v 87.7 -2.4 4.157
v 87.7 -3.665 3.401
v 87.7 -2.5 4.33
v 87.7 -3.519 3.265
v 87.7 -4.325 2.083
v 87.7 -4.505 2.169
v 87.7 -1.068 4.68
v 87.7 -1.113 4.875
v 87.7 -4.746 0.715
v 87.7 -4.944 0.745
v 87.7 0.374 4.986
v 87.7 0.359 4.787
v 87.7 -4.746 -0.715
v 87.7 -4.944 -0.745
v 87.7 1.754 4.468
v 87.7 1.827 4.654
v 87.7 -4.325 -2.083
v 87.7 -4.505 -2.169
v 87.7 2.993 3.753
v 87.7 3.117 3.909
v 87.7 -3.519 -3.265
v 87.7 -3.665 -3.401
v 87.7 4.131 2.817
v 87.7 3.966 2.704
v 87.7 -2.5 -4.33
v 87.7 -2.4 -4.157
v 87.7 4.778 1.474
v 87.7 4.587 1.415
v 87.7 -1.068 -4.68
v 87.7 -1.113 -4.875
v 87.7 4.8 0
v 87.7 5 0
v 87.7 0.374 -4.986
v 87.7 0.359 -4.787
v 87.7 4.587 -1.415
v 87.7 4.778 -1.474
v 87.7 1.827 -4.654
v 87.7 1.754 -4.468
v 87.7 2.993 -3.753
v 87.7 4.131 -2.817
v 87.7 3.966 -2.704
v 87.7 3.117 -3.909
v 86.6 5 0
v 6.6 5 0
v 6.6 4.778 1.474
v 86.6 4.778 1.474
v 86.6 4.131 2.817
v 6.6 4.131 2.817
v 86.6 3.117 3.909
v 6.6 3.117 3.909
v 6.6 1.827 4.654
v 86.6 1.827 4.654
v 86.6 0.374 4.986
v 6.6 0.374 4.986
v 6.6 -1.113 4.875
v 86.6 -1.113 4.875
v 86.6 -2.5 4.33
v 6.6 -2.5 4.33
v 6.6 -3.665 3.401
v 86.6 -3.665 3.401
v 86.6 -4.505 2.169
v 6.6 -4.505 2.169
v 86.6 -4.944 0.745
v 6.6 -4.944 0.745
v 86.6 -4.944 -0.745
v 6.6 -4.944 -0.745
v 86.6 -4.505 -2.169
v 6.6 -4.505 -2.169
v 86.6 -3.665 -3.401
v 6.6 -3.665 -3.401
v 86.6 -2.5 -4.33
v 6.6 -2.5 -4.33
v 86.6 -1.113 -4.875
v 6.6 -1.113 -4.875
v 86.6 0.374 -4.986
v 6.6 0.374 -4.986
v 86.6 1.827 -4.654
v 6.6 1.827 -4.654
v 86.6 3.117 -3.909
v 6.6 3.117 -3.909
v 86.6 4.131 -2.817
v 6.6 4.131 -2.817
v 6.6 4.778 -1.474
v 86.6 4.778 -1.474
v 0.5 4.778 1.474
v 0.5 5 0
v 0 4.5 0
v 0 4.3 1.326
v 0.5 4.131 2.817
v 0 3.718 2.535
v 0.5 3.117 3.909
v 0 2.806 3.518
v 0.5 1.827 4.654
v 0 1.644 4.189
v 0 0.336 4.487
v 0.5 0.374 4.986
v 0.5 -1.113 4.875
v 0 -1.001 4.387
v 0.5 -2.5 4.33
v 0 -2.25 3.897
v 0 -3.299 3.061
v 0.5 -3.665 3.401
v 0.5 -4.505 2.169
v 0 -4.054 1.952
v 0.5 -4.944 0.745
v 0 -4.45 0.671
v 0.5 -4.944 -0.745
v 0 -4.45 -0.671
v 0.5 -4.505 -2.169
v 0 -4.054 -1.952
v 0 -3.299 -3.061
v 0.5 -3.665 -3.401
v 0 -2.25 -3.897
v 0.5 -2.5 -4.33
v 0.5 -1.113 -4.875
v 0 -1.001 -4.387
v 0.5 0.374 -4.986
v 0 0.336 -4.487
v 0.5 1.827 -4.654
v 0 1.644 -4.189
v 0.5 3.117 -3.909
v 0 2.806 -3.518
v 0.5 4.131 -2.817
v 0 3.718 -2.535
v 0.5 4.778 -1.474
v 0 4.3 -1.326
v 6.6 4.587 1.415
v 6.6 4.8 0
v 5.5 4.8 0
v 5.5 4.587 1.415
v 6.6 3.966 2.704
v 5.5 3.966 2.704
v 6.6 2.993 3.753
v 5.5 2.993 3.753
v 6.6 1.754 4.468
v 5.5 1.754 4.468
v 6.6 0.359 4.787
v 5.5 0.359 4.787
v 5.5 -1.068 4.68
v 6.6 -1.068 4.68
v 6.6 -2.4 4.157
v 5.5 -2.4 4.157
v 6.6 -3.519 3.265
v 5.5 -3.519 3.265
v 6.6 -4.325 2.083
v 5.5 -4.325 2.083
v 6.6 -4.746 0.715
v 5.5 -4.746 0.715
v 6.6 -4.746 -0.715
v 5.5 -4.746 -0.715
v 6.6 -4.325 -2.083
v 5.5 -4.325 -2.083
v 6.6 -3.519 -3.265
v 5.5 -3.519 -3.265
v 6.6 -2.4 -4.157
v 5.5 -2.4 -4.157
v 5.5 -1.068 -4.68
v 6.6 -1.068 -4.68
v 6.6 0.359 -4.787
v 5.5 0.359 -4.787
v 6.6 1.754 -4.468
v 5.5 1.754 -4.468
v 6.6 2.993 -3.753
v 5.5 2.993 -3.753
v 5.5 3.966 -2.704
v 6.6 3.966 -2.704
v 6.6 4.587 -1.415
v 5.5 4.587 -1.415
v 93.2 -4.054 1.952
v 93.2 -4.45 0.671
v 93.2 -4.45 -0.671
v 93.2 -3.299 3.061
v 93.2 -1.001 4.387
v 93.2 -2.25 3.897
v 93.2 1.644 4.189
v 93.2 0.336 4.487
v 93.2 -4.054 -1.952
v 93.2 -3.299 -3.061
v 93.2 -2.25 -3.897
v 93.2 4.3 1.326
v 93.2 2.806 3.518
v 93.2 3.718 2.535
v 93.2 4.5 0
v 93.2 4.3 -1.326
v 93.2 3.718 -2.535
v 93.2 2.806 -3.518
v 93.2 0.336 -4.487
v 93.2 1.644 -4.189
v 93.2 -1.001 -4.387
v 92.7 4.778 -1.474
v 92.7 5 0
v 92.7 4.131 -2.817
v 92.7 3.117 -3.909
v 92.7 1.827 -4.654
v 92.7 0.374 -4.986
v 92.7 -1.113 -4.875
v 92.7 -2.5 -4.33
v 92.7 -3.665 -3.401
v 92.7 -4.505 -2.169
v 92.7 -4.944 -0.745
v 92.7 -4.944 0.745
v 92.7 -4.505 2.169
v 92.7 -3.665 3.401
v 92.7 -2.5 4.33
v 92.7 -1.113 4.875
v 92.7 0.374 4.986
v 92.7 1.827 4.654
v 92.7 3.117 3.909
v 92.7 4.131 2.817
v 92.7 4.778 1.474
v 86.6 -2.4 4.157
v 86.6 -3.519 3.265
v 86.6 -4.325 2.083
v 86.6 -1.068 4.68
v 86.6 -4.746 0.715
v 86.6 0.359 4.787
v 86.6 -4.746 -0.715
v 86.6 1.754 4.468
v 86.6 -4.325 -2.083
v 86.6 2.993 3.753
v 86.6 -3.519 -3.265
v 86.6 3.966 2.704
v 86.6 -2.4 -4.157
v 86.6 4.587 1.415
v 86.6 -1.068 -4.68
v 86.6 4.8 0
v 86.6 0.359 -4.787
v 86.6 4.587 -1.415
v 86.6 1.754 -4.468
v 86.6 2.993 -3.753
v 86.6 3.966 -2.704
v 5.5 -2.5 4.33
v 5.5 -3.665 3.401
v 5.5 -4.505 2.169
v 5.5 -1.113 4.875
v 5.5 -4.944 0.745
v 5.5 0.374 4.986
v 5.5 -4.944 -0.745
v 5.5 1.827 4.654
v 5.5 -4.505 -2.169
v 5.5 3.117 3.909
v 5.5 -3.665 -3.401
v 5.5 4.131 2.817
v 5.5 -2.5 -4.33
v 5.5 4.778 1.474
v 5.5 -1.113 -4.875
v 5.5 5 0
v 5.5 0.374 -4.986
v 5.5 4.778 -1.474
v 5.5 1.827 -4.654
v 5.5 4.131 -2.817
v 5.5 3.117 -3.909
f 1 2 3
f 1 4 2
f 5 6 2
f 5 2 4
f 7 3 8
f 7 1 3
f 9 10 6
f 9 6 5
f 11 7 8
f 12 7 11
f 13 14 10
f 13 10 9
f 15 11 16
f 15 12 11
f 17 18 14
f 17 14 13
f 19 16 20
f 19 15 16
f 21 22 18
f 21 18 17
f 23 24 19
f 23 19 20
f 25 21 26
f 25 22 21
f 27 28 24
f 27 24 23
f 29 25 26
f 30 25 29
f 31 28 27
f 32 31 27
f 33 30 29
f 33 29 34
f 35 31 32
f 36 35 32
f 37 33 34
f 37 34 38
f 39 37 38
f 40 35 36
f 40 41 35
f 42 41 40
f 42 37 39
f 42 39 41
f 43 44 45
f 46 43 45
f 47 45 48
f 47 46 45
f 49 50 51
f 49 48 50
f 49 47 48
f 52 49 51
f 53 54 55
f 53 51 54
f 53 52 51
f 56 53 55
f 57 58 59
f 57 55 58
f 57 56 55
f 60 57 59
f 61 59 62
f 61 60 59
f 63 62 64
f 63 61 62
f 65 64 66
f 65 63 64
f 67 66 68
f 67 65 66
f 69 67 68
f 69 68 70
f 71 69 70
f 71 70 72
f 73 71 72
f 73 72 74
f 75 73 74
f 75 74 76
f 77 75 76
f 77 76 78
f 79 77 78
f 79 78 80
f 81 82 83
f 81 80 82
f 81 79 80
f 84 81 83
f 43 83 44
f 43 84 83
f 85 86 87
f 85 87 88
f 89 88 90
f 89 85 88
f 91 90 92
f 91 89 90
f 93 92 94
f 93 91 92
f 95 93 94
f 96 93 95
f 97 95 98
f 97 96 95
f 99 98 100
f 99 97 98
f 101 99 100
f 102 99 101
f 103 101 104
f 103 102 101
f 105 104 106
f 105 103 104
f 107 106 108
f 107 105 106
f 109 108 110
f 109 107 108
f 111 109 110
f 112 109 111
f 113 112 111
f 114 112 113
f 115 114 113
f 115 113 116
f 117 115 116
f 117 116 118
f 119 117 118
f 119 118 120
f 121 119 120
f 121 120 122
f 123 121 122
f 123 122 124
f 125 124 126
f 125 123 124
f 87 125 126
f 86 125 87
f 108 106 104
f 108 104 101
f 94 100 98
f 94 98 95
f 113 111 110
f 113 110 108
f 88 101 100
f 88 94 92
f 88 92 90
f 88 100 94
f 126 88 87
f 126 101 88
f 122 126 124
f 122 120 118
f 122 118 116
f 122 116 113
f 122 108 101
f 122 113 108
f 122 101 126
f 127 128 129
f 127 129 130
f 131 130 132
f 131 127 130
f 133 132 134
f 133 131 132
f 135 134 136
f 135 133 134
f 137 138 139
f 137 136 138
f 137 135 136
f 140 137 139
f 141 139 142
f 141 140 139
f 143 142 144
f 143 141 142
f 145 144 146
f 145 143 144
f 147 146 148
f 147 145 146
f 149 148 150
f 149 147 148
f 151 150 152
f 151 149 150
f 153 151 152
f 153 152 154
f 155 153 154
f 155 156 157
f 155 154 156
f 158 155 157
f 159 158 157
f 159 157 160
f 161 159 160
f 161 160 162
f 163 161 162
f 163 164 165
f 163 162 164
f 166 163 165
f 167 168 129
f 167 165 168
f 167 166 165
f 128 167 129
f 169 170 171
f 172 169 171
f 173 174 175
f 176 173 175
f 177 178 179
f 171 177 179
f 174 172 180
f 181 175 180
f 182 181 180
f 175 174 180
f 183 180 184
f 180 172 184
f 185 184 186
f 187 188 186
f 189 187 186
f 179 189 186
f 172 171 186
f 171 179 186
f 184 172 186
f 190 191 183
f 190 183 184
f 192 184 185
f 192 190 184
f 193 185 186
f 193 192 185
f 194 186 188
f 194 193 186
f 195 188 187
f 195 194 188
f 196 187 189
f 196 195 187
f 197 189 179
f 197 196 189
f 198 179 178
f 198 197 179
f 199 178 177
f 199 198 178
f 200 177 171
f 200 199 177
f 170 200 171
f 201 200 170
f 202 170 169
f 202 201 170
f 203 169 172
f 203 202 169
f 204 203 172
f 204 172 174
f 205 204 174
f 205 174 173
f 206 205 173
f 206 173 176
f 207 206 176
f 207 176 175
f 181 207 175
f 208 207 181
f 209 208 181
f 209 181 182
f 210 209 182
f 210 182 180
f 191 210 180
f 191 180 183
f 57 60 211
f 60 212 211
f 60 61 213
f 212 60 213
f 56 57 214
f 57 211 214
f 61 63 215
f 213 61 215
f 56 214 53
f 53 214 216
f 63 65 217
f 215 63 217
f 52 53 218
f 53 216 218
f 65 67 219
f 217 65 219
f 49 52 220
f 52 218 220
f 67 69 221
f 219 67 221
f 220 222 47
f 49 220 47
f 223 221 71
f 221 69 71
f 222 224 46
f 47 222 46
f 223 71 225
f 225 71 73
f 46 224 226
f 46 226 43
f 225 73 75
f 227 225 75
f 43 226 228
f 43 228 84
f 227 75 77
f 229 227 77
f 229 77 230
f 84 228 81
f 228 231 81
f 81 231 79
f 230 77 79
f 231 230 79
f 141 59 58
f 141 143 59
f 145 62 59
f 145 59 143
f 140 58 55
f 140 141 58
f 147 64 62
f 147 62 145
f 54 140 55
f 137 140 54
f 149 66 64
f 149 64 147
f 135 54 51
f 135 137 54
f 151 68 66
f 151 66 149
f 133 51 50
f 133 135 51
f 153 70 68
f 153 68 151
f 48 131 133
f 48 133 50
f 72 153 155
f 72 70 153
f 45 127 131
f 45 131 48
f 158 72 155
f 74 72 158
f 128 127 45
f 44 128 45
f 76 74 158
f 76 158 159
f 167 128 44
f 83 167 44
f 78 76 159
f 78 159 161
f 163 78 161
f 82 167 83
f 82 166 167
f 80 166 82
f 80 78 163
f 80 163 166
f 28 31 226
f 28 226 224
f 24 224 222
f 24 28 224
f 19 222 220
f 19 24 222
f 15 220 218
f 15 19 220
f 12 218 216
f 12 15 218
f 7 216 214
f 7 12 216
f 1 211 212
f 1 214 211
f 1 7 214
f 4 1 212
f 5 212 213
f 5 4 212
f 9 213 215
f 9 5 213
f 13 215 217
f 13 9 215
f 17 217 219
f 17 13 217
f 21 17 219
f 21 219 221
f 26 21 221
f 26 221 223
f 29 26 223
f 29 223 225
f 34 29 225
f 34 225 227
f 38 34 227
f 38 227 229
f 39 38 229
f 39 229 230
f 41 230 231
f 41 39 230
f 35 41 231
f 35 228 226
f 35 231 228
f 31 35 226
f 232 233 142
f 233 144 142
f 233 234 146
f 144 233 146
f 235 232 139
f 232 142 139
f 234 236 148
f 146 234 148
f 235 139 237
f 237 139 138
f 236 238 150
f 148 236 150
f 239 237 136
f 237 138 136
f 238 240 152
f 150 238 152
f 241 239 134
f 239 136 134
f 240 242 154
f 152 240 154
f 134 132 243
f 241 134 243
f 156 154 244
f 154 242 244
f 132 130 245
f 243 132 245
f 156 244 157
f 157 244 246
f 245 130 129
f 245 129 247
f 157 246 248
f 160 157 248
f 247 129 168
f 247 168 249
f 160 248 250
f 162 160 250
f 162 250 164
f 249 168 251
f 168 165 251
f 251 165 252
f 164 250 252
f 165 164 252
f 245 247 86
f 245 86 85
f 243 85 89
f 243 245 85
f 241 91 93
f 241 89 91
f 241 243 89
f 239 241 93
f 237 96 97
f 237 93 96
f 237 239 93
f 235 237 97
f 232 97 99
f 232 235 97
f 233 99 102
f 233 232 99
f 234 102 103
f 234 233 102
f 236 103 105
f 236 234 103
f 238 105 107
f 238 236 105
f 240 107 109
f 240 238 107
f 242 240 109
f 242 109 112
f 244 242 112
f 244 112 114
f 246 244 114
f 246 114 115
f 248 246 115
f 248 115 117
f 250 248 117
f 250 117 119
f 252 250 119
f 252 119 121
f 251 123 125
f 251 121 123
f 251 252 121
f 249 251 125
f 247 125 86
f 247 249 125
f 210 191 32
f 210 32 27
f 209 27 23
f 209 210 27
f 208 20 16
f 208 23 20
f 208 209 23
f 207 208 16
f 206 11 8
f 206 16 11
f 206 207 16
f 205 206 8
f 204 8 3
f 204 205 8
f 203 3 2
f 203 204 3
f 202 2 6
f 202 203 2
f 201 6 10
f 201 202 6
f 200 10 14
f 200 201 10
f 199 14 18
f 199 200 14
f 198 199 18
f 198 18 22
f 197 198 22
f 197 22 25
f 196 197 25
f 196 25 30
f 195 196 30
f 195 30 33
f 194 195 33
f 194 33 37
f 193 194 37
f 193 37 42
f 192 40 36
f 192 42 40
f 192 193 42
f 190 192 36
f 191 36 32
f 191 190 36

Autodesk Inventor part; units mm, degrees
ref_plane "YZ Plane" through (0, 0, 0) normal (1, 0, 0) x (0, 1, 0)
ref_plane "XZ Plane" through (0, 0, 0) normal (0, 1, 0) x (-1, 0, 0)
sketch "Skizze1" plane through (0, 0, 0) normal (0, 0, 1) x (1, 0, 0)
  line L0 (0, 0) -> (0, 5)
  line L1 (93.2, 5) -> (93.2, 0)
  line L2 (93.2, 0) -> (0, 0)
  line L3 (5.5, 5) -> (5.5, 4.8)
  line L4 (5.5, 4.8) -> (6.6, 4.8)
  line L5 (6.6, 4.8) -> (6.6, 5)
  line L6 (0, 5) -> (5.5, 5)
  line L7 (86.6, 5) -> (86.6, 4.8)
  line L8 (86.6, 4.8) -> (87.7, 4.8)
  line L9 (87.7, 4.8) -> (87.7, 5)
  line L10 (6.6, 5) -> (86.6, 5)
  line L11 (87.7, 5) -> (93.2, 5)
  line L12 (46.6, 0) -> (46.6, 5) construction
  line L13 (0.5, 5) -> (0.5, 0) construction
  line L14 (92.7, 5) -> (92.7, 0) construction
  line L15 (15.6, 0) -> (15.6, 5) construction
  line L16 (77.6, 0) -> (77.6, 5) construction
  line L17 (28.6, 5) -> (28.6, 0) construction
  line L18 (64.6, 5) -> (64.6, 0) construction
  dimension "d2" = 10
  dimension "d3" = 9.6
  dimension "d4" = 1.1
  dimension "d6" = 1.1
  dimension "d8" = 82.2
  dimension "d9" = 5
  dimension "d10" = 5
  dimension "d11" = 0.5
  dimension "d12" = 93.2
  dimension "d16" = 31
  dimension "d17" = 62
  dimension "d18" = 13
  dimension "d19" = 13
revolve "Umdrehung1" add sketch "Skizze1" angle 360 about axis through (93.2, 0, 0) along (-1, 0, 0)
sketch "Skizze2" plane through (46.6, 0, 5) normal (0, 0, 1) x (1, 0, 0)
  line L0 (-31, 0) -> (-31, 5) construction
  line L1 (-18, 5) -> (-18, 0) construction
  line L2 (18, 5) -> (18, 0) construction
  line L3 (31, 0) -> (31, 5) construction
  line L4 (-31, 5) -> (-18, 5)
  line L5 (-18, 5) -> (-18, -5)
  line L6 (-18, -5) -> (-31, -5)
  line L7 (-31, -5) -> (-31, 5)
  line L8 (18, 5) -> (31, 5)
  line L9 (31, 5) -> (31, -5)
  line L10 (31, -5) -> (18, -5)
  line L11 (18, -5) -> (18, 5)
  point P0 (-46.6, 0)
  dimension "d20" = 10
  dimension "d21" = 10
chamfer "Fase1" distance 0.5 angle 45 2 edges at (0, -5, 0) (93.2, -5, 0)
ref_plane "Arbeitsebene1" through (46.6, 0, 5) normal (0, 0, 1) x (1, 0, 0)
equation "\"d20\" = d2"
equation "\"d21\" = d20"
equation "\"d6\" = d4"
equation "\"d10\" = d9"
equation "\"d19\" = d18"
properties part number "ParallelMecha_DrivenShaft" material "Edelstahl"
